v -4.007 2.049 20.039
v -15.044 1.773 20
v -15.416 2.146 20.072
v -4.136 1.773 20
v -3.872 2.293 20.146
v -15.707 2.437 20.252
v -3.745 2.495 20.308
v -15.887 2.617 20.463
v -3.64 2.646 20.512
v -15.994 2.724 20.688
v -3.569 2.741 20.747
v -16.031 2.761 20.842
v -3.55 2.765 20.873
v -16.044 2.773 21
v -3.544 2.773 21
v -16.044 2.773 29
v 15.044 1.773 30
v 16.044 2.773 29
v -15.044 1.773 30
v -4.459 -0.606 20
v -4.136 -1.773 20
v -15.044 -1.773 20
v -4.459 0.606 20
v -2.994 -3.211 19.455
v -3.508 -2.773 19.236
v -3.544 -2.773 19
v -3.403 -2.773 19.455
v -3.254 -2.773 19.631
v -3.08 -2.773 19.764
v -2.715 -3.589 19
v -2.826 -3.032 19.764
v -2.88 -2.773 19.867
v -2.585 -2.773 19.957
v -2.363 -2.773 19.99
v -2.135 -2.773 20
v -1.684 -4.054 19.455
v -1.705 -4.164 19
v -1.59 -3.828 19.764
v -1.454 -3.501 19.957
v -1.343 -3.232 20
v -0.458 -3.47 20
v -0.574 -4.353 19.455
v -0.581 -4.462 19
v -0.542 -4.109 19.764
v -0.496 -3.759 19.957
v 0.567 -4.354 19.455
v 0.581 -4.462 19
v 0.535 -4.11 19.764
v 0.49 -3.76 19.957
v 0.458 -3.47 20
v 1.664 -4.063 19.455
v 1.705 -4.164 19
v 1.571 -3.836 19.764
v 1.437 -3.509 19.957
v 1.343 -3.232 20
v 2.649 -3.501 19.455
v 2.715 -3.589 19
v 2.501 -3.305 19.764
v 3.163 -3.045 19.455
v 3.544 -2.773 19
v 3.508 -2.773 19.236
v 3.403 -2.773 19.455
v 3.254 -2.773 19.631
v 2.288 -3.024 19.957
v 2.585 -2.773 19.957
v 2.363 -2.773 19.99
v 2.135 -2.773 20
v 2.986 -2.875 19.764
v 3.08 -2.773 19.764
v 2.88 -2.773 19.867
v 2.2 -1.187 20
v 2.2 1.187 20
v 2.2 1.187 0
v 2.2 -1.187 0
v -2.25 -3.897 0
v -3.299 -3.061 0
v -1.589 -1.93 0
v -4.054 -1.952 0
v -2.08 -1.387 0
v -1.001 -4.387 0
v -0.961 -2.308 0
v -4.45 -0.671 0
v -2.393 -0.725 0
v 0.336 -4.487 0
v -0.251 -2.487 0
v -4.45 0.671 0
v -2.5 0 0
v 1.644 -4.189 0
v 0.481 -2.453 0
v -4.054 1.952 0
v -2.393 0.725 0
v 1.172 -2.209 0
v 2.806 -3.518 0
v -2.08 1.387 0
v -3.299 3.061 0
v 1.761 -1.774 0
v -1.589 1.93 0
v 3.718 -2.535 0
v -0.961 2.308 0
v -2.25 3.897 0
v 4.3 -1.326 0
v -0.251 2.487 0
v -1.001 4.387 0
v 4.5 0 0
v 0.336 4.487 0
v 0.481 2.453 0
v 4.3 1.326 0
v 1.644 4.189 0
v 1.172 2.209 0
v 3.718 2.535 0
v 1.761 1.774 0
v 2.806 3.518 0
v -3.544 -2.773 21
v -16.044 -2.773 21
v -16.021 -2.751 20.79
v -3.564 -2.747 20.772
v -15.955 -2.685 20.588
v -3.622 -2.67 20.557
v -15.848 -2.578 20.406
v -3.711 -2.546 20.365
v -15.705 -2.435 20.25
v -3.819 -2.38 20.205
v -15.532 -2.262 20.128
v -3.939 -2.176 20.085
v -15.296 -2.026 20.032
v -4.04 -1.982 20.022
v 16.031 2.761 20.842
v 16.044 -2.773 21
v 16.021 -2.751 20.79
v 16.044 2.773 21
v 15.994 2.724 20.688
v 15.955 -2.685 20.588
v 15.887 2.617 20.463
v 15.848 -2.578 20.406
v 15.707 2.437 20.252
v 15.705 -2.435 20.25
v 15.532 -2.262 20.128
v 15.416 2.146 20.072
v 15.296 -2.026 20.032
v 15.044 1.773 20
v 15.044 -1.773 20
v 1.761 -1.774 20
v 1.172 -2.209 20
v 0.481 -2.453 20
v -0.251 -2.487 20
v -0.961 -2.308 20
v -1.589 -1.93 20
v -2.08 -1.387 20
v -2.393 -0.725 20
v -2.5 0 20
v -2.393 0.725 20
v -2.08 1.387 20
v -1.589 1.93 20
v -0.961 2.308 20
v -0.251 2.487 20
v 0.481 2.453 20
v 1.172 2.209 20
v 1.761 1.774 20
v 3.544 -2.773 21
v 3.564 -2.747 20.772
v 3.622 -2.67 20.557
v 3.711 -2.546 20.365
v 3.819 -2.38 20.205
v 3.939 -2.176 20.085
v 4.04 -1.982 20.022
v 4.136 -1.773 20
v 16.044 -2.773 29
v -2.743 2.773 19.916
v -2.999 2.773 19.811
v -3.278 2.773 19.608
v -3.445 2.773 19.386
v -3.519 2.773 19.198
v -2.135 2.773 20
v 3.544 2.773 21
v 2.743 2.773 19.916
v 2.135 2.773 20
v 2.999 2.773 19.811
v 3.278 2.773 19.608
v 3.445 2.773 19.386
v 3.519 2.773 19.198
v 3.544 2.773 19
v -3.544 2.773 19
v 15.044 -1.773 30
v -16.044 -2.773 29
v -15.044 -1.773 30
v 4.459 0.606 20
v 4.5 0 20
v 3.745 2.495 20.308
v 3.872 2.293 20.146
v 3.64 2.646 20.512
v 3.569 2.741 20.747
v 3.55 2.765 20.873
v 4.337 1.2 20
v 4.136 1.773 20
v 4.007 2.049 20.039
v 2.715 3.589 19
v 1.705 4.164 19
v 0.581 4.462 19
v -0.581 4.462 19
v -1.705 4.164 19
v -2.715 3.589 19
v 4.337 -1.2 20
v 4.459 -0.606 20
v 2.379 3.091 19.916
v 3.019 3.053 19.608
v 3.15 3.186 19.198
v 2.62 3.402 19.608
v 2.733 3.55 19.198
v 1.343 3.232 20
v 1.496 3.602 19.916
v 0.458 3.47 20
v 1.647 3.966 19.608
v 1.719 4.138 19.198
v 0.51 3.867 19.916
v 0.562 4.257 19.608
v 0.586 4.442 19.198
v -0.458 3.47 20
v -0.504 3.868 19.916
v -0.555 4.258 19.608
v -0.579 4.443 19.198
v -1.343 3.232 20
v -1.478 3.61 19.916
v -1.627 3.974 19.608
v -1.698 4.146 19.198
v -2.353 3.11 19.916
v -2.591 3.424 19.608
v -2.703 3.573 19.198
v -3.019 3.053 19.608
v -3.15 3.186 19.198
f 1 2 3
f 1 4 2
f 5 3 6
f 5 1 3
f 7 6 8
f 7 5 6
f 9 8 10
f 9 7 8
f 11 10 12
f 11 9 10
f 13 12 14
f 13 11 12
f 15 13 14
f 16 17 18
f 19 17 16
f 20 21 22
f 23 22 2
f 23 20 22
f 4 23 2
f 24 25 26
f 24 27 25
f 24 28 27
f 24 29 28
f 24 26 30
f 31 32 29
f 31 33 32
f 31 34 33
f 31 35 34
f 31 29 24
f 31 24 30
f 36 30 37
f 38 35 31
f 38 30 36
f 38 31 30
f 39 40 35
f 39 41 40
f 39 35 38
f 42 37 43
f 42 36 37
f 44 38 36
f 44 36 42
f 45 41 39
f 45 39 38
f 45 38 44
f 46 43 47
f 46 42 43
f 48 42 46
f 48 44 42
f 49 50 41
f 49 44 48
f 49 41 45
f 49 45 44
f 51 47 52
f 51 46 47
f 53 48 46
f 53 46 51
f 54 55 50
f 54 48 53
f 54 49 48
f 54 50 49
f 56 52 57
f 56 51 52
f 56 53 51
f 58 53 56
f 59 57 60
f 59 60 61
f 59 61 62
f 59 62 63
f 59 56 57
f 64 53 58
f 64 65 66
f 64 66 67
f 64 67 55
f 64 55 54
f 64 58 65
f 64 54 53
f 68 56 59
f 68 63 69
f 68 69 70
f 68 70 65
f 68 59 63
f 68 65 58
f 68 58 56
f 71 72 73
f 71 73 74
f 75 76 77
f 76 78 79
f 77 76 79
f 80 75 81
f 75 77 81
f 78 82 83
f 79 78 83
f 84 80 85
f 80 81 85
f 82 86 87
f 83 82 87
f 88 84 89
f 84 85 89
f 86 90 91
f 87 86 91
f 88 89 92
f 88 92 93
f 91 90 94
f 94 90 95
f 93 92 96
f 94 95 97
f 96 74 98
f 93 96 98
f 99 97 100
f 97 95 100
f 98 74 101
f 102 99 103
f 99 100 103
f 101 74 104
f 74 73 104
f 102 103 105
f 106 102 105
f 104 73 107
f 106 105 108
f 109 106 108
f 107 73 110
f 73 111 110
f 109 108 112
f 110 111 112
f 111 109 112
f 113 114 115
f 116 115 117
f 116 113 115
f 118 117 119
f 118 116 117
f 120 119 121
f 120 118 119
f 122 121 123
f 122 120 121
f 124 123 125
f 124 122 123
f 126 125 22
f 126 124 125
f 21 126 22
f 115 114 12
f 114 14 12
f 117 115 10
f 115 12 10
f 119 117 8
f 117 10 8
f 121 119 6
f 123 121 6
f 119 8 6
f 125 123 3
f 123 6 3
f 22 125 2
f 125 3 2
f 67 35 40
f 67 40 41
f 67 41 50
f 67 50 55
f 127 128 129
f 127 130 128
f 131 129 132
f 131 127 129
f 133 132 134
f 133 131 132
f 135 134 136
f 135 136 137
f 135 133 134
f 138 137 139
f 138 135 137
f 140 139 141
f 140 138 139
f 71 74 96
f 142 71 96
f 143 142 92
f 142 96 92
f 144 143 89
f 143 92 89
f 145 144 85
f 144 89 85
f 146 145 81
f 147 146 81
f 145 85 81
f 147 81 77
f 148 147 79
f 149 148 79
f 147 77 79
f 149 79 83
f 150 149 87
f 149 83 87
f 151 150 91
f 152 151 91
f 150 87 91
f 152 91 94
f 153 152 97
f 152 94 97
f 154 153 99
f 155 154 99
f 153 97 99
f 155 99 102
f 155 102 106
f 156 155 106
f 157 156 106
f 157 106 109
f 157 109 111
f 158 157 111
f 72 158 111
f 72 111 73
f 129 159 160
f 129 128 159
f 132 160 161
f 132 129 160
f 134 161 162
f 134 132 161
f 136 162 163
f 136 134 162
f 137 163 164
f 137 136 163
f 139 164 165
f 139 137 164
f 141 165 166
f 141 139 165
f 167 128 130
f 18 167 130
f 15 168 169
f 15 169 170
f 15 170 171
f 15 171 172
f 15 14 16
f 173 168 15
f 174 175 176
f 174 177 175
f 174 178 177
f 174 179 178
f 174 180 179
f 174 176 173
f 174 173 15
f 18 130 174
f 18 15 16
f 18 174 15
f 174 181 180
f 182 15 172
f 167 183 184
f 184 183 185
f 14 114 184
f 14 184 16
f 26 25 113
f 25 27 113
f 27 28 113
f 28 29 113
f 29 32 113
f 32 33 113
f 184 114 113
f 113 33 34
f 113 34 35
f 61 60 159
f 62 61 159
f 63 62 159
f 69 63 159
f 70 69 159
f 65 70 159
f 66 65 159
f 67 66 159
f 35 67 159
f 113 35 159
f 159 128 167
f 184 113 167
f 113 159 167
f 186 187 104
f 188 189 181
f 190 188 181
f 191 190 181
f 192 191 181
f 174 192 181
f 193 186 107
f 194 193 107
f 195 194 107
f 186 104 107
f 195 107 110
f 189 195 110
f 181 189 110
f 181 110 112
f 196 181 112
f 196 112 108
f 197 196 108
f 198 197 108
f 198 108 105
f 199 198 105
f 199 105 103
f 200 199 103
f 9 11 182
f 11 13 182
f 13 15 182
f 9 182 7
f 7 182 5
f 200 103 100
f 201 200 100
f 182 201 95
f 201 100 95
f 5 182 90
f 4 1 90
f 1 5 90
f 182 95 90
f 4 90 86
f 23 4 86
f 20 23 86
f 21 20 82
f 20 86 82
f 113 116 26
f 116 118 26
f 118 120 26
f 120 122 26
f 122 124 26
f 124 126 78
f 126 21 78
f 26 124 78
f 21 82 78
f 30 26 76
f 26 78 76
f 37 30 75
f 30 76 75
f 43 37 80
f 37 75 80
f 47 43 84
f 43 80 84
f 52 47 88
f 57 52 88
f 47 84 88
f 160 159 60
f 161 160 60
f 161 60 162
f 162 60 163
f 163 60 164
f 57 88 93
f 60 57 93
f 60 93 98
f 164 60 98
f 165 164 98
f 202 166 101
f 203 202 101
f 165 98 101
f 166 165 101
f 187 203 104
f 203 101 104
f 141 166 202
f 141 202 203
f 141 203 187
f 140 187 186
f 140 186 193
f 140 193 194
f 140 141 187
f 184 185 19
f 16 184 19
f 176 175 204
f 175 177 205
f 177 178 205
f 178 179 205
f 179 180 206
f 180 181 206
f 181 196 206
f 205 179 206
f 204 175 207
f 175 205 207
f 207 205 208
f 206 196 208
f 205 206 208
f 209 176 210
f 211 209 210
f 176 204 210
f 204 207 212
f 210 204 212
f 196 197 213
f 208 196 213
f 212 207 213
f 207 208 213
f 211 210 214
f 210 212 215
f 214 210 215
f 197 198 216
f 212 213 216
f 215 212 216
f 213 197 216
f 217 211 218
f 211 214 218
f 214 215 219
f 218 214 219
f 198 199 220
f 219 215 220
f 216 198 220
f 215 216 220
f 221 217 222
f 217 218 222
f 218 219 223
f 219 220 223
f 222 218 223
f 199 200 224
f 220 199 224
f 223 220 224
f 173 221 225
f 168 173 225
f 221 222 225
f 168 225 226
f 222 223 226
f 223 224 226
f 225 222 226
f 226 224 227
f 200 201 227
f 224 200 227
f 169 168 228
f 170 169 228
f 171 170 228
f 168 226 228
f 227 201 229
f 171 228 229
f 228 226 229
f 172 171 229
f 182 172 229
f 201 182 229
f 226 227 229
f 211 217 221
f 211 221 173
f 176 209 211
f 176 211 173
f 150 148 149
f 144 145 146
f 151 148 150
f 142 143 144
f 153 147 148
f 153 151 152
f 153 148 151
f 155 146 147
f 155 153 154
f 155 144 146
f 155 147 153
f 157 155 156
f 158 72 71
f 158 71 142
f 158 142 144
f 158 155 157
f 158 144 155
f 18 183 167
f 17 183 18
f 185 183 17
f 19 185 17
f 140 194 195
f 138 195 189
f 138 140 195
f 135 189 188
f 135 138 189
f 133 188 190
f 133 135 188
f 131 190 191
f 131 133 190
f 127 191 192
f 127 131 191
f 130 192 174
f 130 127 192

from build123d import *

# Parameters (mm, degrees)
F0_R        = 4.5
F1_DEPTH    = 20
F2_W        = 7.0876832783
F2_H        = 5.546597673
F3_DEPTH    = 10
F4_DEPTH    = 12.5
F5_SIZE     = 1
F6_T4_ANGLE = 167.6048406122
F6_T9_ANGLE = 167.6048406122
F7_R        = 1


# Not quite as in the source:
# - a fillet or chamfer that OpenCascade refuses, or shapes differently, is made with other operations: its cross-section is extruded or revolved along the edge and cut away or added


with BuildPart() as f1:
    # F0 (on Top) → F1 (new body)
    with BuildSketch(Plane.XY):
        Circle(F0_R)
        with BuildLine():
            ThreePointArc((2.2, 1.1874342087), (2.4238399287, 0.6123724357), (2.5, 0))
            ThreePointArc((2.5, 0), (2.4238399287, -0.6123724357), (2.2, -1.1874342087))
            ThreePointArc((2.2, -1.1874342087), (-2.5, 0), (2.2, 1.1874342087))
        make_face(mode=Mode.SUBTRACT)
        with BuildLine():
            ThreePointArc((2.2, -1.1874342087), (2.4238399287, -0.6123724357), (2.5, 0))
            ThreePointArc((2.5, 0), (2.4238399287, 0.6123724357), (2.2, 1.1874342087))
            Line((2.2, 1.1874342087), (2.2, -1.1874342087))
        make_face()
    extrude(amount=F1_DEPTH)

    # F2 (on face) → F3 (join)
    with BuildSketch(Plane.XY.offset(20)):
        Rectangle(F2_W, F2_H)
        with BuildLine():
            Line((2.2, 1.1874342087), (2.2, -1.1874342087))
            ThreePointArc((2.2, -1.1874342087), (-2.5, 0), (2.2, 1.1874342087))
        make_face(mode=Mode.SUBTRACT)
    extrude(amount=F3_DEPTH)

    # F4 (add, symmetric): faces of the model
    f4_faces = [f1.faces().sort_by_distance(p)[0] for p in [
        (3.5438416392, 0, 25),
        (-3.5438416392, 0, 25),
    ]]
    extrude(f4_faces, amount=F4_DEPTH, both=True, dir=(1, 0, 0))

    # F5
    f5_edges = [f1.edges().sort_by_distance(p)[0] for p in [
        (0, -2.773299, 30),
        (0, 2.773299, 30),
        (16.043842, 0, 30),
        (-16.043842, 0, 30),
    ]]
    chamfer(f5_edges, length=F5_SIZE)

    # F6: fillet of radius 1 on 2 edges, made by hand


with BuildPart() as f6_tool2:
    # F6_s3 → F6_t4 (revolve)
    with BuildSketch(Plane(origin=(0, 0, 0), x_dir=(0, 0, 1), z_dir=(0.1079573604, -0.9941555252, 0))):
        with BuildLine():
            ThreePointArc((20, -3.5), (19.7071067812, -4.2071067812), (19, -4.5))
            Line((19, -4.5), (20, -4.5))
            Line((20, -4.5), (20, -3.5))
        make_face()
    revolve(axis=Axis((0, 0, 20), (0, 0, 1)), revolution_arc=F6_T4_ANGLE)

    split(bisect_by=Plane.XZ.offset(-2.7732988365), keep=Keep.BOTTOM)


with BuildPart() as f1_1:
    add(f1.part)

    # F6_t1: cut F6_tool2
    add(f6_tool2.part, mode=Mode.SUBTRACT)


with BuildPart() as f6_tool7:
    # F6_s8 → F6_t9 (revolve)
    with BuildSketch(Plane(origin=(0, 0, 0), x_dir=(0, 0, 1), z_dir=(-0.1079573604, 0.9941555252, 0))):
        with BuildLine():
            ThreePointArc((19, -4.5), (19.7071067812, -4.2071067812), (20, -3.5))
            Line((20, -3.5), (20, -4.5))
            Line((20, -4.5), (19, -4.5))
        make_face()
    revolve(axis=Axis((0, 0, 20), (0, 0, 1)), revolution_arc=F6_T9_ANGLE)

    split(bisect_by=Plane.XZ.offset(2.7732988365), keep=Keep.TOP)


with BuildPart() as f1_2:
    add(f1_1.part)

    # F6_t6: cut F6_tool7
    add(f6_tool7.part, mode=Mode.SUBTRACT)

    # F7
    f7_edges = [f1_2.edges().sort_by_distance(p)[0] for p in [
        (9.793842, 2.773299, 20),
        (-9.793842, 2.773299, 20),
        (9.793842, -2.773299, 20),
        (-9.793842, -2.773299, 20),
        (16.043842, 0, 20),
        (-16.043842, 0, 20),
    ]]
    fillet(f7_edges, radius=F7_R)


solid = f1_2.part
